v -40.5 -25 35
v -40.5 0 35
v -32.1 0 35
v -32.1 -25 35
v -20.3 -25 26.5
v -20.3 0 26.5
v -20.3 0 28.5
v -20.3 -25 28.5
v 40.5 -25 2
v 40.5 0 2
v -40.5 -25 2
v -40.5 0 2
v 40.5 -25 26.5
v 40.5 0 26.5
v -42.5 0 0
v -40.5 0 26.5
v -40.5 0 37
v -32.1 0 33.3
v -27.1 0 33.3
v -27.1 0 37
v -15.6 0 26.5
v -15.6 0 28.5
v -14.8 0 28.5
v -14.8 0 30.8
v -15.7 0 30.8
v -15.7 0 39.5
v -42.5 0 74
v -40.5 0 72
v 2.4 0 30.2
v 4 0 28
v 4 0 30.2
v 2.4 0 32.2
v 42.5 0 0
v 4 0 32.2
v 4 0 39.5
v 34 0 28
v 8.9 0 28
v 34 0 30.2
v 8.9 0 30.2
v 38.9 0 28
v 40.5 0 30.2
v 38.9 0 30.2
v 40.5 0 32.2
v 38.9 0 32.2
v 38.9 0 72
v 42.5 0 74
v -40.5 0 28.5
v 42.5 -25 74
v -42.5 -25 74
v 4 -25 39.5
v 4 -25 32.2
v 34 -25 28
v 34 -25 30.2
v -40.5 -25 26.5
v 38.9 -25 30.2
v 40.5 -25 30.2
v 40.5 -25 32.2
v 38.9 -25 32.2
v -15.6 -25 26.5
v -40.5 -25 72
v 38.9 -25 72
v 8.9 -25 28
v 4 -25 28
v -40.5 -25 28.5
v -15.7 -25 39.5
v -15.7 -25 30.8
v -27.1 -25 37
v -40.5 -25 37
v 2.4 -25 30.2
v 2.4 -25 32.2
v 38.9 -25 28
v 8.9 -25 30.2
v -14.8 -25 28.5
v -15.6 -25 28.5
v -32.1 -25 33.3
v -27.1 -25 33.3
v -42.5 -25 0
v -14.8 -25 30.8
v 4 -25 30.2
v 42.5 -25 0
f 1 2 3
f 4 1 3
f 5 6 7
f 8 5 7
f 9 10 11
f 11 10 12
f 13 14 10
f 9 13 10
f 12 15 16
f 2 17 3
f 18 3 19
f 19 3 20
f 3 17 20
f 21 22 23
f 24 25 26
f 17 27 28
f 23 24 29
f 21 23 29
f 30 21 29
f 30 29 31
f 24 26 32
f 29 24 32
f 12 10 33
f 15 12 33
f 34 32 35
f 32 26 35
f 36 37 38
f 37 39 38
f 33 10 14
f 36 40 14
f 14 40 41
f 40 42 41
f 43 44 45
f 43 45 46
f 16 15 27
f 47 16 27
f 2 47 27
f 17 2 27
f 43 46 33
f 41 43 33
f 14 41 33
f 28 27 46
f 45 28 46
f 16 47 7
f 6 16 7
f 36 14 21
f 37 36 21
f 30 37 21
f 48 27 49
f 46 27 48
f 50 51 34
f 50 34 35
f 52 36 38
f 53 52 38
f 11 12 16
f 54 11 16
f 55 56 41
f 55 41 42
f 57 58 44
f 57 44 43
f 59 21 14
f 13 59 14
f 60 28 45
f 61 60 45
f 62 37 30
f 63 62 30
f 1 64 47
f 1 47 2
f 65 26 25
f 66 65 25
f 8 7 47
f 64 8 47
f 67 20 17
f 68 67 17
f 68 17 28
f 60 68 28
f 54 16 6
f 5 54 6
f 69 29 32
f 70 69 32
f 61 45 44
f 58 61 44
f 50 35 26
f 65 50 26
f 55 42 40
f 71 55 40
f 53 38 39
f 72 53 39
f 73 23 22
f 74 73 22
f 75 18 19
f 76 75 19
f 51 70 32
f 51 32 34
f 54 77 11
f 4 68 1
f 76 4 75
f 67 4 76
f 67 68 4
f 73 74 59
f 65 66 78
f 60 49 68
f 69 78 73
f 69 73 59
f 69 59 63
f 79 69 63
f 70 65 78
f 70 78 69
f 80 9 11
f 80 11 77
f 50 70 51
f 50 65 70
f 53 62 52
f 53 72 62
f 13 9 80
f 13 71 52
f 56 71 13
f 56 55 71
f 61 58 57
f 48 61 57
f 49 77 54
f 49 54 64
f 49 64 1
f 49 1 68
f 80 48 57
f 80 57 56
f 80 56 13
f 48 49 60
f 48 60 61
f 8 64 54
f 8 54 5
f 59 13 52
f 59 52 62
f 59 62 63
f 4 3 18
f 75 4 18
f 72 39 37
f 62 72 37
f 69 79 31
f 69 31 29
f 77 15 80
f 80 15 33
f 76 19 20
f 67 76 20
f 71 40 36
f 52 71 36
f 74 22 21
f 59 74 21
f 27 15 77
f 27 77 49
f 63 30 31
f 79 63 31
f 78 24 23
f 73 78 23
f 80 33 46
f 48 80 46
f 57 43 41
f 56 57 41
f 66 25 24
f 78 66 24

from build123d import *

# Parameters (mm, degrees)
F0_W     = 85
F0_H     = 74
F1_DEPTH = 25


with BuildPart() as f1:
    # F0 (on Front) → F1 (new body)
    with BuildSketch(Plane.XZ):
        with Locations((0, 37)):
            Rectangle(F0_W, F0_H)
        Polygon((40.5, 2), (-40.5, 2), (-40.5, 26.5), (-20.3, 26.5), (-20.3, 28.5), (-40.5, 28.5), (-40.5, 35), (-32.1, 35), (-32.1, 33.3), (-27.1, 33.3), (-27.1, 37), (-40.5, 37), (-40.5, 72), (38.9, 72), (38.9, 32.2), (40.5, 32.2), (40.5, 30.2), (38.9, 30.2), (38.9, 28), (34, 28), (34, 30.2), (8.9, 30.2), (8.9, 28), (4, 28), (4, 30.2), (2.4, 30.2), (2.4, 32.2), (4, 32.2), (4, 39.5), (-15.7, 39.5), (-15.7, 30.8), (-14.8, 30.8), (-14.8, 28.5), (-15.6, 28.5), (-15.6, 26.5), (40.5, 26.5), align=None, mode=Mode.SUBTRACT)
    extrude(amount=F1_DEPTH)


solid = f1.part
